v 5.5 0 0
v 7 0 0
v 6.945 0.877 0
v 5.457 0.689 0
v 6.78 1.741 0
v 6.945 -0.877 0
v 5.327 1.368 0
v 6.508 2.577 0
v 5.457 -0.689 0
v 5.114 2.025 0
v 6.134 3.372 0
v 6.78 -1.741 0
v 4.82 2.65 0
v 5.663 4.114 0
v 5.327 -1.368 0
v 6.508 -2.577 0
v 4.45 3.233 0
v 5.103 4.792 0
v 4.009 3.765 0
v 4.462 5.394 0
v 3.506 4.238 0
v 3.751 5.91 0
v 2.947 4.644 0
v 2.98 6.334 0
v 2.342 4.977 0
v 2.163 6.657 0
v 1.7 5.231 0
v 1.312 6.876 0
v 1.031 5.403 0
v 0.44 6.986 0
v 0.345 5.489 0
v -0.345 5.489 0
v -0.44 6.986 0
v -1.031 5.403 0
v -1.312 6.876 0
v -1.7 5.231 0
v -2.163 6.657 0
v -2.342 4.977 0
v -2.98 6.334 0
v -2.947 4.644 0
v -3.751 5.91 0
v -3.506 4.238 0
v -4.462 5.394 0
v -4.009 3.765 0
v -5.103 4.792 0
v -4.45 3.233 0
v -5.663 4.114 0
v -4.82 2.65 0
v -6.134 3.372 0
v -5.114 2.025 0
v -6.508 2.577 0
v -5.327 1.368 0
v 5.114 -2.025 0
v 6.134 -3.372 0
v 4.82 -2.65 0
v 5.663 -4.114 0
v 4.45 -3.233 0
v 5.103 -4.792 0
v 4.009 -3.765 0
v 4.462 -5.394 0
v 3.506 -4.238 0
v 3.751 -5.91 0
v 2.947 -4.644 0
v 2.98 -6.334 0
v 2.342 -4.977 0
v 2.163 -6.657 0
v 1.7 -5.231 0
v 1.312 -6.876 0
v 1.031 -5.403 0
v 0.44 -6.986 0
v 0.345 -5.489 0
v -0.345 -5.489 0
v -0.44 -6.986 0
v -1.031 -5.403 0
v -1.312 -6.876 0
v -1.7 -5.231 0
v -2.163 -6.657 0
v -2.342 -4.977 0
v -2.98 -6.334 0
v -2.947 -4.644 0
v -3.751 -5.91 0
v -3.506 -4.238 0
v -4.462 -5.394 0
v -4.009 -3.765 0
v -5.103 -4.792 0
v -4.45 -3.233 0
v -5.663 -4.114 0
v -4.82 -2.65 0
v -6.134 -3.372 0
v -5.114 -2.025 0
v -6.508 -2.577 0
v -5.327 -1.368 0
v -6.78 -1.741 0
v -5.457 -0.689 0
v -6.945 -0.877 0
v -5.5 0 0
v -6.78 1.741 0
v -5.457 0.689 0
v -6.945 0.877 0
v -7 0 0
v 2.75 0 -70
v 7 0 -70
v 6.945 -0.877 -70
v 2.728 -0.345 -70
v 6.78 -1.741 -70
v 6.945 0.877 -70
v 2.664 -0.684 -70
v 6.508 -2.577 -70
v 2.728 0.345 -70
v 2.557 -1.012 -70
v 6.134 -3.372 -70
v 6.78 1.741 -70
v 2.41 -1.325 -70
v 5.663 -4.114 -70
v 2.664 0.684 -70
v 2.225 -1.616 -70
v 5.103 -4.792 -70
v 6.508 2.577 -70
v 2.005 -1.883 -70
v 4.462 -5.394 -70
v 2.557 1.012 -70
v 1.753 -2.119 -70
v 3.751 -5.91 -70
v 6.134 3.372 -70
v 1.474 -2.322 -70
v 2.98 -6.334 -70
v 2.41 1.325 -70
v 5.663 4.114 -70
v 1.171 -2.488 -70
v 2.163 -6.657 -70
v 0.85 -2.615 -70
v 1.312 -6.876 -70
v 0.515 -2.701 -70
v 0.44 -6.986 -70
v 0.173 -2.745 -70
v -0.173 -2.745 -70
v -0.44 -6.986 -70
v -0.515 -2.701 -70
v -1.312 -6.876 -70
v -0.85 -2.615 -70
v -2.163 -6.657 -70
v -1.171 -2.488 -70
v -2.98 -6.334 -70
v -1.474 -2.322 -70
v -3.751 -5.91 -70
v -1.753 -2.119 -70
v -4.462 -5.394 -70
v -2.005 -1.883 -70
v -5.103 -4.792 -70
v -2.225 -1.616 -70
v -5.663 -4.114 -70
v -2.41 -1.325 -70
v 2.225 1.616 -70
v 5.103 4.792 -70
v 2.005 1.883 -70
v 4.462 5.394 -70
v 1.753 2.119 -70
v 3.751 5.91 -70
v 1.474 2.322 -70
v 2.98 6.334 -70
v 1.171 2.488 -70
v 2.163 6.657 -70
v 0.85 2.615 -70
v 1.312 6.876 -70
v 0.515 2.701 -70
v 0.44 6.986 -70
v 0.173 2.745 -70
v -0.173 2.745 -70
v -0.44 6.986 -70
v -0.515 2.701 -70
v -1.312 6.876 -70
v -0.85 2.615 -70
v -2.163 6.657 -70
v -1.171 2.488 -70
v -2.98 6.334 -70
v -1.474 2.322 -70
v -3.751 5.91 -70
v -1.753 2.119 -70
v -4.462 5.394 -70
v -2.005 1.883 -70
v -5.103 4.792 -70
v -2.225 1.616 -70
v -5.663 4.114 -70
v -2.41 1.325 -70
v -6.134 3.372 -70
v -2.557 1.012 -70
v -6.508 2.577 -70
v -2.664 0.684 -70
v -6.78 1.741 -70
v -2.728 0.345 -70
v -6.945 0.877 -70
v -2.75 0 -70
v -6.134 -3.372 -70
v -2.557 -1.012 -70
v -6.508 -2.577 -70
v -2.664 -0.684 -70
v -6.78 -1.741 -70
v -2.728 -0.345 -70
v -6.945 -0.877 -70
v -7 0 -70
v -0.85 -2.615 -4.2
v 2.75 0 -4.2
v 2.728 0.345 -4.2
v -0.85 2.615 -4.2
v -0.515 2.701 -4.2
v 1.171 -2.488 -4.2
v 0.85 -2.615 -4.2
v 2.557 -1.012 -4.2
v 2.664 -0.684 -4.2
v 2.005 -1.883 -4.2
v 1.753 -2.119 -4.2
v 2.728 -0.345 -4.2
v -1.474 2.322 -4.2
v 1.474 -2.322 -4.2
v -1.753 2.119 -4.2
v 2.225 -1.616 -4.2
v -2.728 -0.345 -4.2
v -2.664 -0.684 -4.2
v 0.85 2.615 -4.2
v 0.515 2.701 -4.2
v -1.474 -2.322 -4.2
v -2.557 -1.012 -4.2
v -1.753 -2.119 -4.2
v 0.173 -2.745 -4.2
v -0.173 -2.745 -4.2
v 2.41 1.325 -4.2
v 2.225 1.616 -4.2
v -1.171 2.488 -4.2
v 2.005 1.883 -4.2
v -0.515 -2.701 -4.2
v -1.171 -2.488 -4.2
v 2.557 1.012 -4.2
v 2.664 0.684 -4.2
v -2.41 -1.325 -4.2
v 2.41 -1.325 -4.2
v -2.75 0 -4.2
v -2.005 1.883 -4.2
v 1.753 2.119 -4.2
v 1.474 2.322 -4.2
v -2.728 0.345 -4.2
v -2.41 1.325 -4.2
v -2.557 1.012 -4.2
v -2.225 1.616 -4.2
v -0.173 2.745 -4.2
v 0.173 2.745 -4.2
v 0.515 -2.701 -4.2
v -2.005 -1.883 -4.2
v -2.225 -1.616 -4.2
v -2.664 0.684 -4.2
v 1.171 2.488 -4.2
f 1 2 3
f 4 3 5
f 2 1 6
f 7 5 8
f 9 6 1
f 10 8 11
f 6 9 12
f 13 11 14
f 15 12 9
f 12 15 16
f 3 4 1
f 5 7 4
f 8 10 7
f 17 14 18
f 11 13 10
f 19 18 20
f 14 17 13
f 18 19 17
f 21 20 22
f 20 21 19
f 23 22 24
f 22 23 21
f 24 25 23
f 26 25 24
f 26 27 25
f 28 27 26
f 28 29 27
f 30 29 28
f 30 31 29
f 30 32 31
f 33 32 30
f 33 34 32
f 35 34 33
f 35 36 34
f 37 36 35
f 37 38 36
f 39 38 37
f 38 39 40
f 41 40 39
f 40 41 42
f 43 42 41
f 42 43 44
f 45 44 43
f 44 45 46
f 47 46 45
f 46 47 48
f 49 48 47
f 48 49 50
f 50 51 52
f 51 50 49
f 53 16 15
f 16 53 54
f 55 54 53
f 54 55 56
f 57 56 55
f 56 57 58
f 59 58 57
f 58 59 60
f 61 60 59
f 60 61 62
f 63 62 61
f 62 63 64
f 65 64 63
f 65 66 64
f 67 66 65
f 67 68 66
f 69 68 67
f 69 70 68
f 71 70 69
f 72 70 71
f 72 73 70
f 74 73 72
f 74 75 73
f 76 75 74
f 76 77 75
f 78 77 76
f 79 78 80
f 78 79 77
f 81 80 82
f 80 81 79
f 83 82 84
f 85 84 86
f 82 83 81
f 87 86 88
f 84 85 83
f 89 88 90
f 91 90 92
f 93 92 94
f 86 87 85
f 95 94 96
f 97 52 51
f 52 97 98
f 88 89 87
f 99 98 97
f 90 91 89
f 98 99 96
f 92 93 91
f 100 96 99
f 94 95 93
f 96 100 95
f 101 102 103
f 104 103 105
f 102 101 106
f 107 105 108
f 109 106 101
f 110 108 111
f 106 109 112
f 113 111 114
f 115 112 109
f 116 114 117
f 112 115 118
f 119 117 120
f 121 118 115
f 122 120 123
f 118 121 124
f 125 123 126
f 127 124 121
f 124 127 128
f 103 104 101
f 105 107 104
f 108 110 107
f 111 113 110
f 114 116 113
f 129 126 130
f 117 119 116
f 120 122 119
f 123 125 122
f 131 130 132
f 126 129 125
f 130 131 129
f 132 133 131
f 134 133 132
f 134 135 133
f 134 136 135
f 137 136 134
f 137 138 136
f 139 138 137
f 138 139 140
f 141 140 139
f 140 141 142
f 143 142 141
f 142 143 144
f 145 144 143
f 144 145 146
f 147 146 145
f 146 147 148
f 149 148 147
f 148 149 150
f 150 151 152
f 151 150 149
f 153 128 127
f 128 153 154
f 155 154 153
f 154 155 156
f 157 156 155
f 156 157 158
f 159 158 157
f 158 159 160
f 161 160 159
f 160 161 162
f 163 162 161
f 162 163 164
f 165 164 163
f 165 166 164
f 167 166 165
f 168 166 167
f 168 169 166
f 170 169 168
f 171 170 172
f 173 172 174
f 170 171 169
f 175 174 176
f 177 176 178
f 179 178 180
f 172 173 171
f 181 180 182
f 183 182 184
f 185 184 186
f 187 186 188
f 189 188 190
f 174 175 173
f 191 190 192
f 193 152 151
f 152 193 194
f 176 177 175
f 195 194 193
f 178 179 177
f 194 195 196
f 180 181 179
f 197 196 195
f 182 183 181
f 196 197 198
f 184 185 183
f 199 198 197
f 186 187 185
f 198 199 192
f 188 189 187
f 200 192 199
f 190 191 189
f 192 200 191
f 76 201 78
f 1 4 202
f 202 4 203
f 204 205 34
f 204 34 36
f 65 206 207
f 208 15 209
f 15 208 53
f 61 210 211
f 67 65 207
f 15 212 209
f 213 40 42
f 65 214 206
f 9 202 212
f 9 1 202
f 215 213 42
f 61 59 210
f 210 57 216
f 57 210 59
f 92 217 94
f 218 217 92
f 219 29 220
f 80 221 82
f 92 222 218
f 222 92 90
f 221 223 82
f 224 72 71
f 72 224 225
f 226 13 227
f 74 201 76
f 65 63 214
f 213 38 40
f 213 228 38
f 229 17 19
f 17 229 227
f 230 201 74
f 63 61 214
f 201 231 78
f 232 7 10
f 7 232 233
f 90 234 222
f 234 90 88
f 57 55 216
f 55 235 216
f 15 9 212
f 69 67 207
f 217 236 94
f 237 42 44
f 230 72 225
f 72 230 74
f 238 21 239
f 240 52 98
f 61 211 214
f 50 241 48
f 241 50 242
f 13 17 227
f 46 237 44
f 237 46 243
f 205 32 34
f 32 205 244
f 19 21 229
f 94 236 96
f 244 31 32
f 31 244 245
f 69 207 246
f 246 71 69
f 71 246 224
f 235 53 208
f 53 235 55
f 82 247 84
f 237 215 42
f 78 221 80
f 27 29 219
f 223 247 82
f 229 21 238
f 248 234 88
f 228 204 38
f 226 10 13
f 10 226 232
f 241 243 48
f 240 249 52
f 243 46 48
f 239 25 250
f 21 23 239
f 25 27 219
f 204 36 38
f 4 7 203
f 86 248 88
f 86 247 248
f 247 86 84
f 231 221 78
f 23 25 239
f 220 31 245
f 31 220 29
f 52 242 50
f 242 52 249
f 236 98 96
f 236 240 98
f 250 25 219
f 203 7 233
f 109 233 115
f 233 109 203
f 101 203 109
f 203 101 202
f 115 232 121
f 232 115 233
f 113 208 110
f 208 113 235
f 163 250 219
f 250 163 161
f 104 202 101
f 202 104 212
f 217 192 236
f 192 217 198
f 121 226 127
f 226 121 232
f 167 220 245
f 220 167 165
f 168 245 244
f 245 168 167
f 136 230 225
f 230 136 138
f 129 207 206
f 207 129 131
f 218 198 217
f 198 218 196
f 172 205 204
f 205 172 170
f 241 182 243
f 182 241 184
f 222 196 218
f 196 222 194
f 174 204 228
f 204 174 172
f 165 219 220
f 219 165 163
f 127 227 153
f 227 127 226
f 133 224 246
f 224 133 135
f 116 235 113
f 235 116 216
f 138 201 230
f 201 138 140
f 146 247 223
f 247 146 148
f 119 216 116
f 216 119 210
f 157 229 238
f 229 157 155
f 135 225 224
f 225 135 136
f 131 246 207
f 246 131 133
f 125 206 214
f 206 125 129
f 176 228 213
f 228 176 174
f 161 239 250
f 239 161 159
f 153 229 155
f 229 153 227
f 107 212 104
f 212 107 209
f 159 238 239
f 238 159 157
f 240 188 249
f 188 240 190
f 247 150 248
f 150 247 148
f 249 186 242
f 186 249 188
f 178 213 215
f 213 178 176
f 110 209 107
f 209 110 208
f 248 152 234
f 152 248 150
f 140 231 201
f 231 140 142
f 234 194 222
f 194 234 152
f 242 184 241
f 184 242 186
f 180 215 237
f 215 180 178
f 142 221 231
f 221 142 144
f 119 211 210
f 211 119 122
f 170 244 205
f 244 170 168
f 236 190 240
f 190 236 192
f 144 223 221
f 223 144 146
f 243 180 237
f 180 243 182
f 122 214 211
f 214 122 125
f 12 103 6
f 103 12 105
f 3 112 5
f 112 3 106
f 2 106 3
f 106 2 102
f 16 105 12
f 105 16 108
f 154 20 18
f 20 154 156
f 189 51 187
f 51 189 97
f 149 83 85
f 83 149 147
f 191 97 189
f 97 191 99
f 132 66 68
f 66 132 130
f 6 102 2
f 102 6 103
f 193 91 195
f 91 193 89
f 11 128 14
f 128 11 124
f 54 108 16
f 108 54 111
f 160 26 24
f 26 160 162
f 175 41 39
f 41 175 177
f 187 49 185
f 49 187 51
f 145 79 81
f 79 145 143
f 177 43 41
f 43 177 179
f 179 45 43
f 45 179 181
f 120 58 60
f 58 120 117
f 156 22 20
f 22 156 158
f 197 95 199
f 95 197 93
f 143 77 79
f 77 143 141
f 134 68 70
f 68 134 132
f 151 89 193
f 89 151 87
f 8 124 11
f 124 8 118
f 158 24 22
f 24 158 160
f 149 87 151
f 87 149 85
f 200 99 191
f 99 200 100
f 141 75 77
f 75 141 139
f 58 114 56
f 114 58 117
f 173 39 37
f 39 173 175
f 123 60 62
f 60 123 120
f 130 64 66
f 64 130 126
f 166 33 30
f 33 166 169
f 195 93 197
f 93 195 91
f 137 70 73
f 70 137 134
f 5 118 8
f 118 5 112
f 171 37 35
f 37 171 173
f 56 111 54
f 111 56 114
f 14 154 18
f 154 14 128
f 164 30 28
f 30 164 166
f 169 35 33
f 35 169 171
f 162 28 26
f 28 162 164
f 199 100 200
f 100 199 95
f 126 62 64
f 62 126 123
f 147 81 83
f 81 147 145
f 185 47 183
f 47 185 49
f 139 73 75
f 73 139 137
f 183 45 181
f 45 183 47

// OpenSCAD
$fn = 50;


difference() {
	union() {
		translate(v = [0, 0, -70.0000000000]) {
			cylinder(h = 70, r = 7.0000000000);
		}
	}
	union() {
		translate(v = [0, 0, 0]) {
			rotate(a = [0, 0, 0]) {
				difference() {
					union() {
						#translate(v = [0, 0, -70.0000000000]) {
							cylinder(h = 70, r = 2.2500000000);
						}
						#translate(v = [0, 0, -4.2000000000]) {
							cylinder(h = 4.2000000000, r = 7.0000000000, r1 = 2.7500000000, r2 = 5.5000000000);
						}
						#translate(v = [0, 0, -70.0000000000]) {
							cylinder(h = 70, r = 2.7500000000);
						}
						#translate(v = [0, 0, -70.0000000000]) {
							cylinder(h = 70, r = 2.2500000000);
						}
					}
					union();
				}
			}
		}
	}
}
